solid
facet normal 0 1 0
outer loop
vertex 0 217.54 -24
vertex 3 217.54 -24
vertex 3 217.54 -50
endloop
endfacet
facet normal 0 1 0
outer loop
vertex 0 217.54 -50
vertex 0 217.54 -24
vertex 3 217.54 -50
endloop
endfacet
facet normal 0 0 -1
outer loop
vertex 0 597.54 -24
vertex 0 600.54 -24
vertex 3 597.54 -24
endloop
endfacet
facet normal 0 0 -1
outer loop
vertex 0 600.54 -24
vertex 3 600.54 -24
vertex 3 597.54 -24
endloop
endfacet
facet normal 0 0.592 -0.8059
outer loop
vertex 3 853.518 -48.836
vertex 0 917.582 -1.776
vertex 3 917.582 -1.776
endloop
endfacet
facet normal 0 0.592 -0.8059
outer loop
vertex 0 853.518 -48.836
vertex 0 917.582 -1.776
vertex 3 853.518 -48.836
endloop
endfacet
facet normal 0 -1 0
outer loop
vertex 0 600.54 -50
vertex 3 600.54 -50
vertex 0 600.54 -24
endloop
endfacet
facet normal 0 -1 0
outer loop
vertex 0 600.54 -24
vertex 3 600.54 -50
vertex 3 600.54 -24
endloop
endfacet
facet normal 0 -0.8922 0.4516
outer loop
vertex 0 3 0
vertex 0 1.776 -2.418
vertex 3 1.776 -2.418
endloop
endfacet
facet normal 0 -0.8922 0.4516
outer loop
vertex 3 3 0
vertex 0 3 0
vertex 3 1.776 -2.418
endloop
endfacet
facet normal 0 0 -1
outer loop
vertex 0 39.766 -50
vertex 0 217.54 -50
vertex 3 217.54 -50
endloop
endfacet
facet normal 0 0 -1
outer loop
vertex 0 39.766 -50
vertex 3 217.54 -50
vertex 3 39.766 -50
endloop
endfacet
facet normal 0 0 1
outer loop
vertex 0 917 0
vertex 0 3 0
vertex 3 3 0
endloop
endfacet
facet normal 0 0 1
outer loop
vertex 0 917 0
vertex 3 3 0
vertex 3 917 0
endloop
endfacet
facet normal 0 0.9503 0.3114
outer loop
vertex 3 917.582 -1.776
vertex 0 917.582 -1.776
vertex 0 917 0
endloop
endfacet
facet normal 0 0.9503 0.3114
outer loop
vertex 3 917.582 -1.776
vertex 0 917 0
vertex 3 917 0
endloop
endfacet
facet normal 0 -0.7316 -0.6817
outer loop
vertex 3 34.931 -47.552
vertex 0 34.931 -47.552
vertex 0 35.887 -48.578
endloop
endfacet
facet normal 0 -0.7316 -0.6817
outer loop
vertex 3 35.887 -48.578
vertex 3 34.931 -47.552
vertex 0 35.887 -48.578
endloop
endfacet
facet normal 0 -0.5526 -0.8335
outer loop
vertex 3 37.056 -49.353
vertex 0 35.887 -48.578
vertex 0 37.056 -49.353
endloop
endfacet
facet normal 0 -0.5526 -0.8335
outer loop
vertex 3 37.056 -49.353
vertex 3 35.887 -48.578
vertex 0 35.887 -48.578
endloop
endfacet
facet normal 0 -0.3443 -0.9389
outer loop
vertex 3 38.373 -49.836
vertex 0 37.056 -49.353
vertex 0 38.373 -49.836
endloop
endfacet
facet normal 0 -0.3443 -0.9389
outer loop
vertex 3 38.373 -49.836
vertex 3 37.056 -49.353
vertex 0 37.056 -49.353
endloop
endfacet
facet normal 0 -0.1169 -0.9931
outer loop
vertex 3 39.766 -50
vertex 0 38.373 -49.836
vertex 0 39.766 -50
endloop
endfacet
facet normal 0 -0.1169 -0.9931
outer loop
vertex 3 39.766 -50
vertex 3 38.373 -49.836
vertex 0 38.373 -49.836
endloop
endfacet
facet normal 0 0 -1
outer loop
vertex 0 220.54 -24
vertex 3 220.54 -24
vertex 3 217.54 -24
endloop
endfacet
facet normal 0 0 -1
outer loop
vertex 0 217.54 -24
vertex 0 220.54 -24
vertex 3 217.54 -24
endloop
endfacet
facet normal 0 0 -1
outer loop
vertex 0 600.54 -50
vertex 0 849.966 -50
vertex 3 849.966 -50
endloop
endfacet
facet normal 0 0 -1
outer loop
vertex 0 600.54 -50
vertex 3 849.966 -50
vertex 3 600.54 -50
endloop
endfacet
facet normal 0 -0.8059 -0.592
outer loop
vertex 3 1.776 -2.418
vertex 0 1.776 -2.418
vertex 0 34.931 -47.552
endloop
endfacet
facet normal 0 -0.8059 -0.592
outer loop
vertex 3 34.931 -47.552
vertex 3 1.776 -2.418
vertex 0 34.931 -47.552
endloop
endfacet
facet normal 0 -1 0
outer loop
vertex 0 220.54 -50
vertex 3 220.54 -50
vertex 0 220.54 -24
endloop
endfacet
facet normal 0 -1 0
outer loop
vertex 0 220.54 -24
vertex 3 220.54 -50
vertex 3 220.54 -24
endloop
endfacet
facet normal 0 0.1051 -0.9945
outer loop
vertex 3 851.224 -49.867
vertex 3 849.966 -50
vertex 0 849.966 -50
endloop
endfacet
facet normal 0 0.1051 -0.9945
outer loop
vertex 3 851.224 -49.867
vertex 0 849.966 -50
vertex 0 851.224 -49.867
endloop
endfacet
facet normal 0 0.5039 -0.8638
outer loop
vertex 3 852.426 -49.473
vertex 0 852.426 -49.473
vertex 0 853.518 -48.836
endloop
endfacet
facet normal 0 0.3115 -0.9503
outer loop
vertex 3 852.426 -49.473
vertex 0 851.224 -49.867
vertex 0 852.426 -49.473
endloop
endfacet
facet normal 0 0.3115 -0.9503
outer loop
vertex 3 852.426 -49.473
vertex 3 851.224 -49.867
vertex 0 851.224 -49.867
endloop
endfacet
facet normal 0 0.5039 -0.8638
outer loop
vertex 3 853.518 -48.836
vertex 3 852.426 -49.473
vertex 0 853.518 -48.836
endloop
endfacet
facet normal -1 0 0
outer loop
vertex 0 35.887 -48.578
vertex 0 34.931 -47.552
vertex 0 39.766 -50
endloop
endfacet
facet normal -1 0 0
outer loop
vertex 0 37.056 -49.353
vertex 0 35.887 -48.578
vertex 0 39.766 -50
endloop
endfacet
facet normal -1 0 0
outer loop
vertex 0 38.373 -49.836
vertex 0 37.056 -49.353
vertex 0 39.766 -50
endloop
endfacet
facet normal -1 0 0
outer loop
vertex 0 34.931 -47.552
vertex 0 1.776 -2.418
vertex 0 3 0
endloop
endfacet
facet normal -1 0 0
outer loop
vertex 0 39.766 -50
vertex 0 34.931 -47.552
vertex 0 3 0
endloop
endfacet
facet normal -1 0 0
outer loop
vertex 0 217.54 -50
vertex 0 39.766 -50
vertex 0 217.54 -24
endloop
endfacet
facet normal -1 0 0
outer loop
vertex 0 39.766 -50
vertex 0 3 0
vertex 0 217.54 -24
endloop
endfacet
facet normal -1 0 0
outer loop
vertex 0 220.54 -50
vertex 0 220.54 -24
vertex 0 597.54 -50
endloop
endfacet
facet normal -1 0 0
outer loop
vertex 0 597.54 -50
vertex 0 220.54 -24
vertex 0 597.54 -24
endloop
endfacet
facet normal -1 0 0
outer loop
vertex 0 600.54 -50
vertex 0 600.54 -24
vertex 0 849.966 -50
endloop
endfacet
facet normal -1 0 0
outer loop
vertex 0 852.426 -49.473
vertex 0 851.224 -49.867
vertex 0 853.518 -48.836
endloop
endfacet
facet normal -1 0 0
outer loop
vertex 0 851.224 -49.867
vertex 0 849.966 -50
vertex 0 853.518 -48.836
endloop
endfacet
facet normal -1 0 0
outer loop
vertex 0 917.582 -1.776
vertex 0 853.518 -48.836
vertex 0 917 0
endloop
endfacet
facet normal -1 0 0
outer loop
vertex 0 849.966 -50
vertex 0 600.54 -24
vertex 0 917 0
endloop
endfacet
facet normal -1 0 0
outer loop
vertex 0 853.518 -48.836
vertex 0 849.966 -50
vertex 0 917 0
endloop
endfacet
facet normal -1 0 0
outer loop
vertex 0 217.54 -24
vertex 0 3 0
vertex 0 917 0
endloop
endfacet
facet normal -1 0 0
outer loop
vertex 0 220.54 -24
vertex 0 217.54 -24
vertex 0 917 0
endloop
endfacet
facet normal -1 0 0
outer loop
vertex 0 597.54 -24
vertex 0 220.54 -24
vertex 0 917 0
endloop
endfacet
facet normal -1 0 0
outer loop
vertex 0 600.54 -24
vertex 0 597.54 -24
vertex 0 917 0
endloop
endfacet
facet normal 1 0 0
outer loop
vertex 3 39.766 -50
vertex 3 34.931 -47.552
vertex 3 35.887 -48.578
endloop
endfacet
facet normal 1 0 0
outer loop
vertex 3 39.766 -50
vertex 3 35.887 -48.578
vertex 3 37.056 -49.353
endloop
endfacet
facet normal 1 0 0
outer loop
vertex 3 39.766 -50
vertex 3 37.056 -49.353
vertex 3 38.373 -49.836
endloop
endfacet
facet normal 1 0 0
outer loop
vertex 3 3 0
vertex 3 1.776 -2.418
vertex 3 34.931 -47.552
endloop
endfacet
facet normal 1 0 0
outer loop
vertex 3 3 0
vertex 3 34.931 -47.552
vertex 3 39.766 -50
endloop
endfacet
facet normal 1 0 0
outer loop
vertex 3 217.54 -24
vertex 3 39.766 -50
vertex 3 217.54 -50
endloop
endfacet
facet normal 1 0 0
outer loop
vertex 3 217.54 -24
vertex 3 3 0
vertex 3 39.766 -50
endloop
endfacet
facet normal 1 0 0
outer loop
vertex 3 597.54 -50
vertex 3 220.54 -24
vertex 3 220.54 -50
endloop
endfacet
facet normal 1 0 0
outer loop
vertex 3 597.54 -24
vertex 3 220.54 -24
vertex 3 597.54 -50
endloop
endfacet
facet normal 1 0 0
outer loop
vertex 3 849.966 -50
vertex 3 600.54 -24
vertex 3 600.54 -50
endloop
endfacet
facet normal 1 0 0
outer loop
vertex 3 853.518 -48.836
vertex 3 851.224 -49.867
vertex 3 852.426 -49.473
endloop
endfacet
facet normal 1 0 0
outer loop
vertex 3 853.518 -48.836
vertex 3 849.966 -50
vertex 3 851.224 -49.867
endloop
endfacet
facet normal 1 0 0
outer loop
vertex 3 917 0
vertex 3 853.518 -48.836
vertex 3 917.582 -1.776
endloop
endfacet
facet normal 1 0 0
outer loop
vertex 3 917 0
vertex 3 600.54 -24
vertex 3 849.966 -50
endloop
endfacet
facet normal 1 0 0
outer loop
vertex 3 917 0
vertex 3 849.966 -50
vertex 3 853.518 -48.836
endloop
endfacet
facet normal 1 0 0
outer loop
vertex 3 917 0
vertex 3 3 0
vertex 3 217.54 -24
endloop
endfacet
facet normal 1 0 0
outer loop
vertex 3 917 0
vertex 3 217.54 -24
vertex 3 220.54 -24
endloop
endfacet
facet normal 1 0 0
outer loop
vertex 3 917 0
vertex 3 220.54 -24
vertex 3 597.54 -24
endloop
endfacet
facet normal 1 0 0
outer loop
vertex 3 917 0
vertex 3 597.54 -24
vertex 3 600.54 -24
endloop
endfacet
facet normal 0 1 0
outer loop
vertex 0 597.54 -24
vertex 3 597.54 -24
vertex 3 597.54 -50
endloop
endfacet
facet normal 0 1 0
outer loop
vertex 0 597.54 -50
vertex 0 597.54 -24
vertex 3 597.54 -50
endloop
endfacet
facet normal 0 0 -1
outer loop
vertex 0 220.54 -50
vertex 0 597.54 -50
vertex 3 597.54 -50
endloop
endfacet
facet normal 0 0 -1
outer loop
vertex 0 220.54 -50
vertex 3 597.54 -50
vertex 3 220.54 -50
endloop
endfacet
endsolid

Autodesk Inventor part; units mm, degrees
ref_plane "YZ Plane" through (0, 0, 0) normal (1, 0, 0) x (0, 1, 0)
ref_plane "XZ Plane" through (0, 0, 0) normal (0, 1, 0) x (-1, 0, 0)
ref_plane "XY Plane" through (0, 0, 0) normal (0, 0, 1) x (1, 0, 0)
sketch "Sketch2" plane through (0, 0, 0) normal (1, 0, 0) x (0, 1, 0)
  line L0 (0, 0) -> (920, 0)
  line L1 (920, 0) -> (920, -50)
  line L2 (920, -50) -> (0, -50)
  line L3 (0, -50) -> (0, 0)
  line L4 (920, -50) -> (883.2713, 0) construction
  line L5 (920, 0) -> (851.9332, -50)
  line L6 (0, 0) -> (36.7287, -50)
  dimension "d28" = 920
  dimension "d29" = 50
  dimension "d31" = 36.3
  dimension "d32" = 53.7
  dimension "d36" = 53.7
extrude "Plate2" add sketch "Sketch2" along normal blind 3 contours L0 L5 L2 L6
chamfer "Corner Chamfer1" distance 3 angle 45 2 edges at (1.5, 920, 0) (1.5, 0, 0)
fillet "Corner Round1" radius 6 2 edges at (1.5, 36.7287, -50) (1.5, 851.9332, -50)
sketch "Sketch3" plane through (3, 0, 0) normal (1, 0, 0) x (0, 0, -1)
  line L0 (24, 217.54) -> (50, 217.54)
  line L1 (50, 217.54) -> (50, 220.54)
  line L2 (50, 220.54) -> (24, 220.54)
  line L3 (24, 220.54) -> (24, 217.54)
  line L4 (50, 849.9663) -> (50, 39.766) projected
  line L5 (50, 219.04) -> (0, 219.04) construction
  line L6 (0, 3) -> (0, 917) projected
  line L7 (50, 599.04) -> (0, 599.04) construction
  line L8 (24, 597.54) -> (50, 597.54)
  line L9 (50, 597.54) -> (50, 600.54)
  line L10 (50, 600.54) -> (24, 600.54)
  line L11 (24, 600.54) -> (24, 597.54)
  point P0 (0, 0)
  dimension "d39" = 26
  dimension "d40" = 3
  dimension "d41" = 219.04
  dimension "d42" = 599.04
  dimension "d43" = 3
  dimension "d44" = 26
extrude "Extrusion1" cut sketch "Sketch3" against normal through all
sketch "Sketch4" plane through (3, 0, 0) normal (1, 0, 0) x (0, 0, -1)
  line L0 (17.0121, 486.3959) -> (33.8114, 486.3959) construction
  line L1 (33.8114, 486.3959) -> (33.8114, 335.9678) construction
  line L2 (33.8114, 335.9678) -> (17.0121, 335.9678) construction
  line L3 (17.0121, 335.9678) -> (17.0121, 486.3959) construction
  point P0 (0, 0)
mark "Mark1"
equation "\"d36\" = d32"
equation "\"d40\" = Thickness"
equation "\"d43\" = Thickness"
equation "\"d44\" = d39"
equation "\"d30\" = Thickness"
equation "\"BendReliefWidth\" = Thickness"
equation "\"BendReliefDepth\" = 0.5 * Thickness"
equation "\"CornerReliefSize\" = 4 * Thickness"
equation "\"MinimumRemnant\" = 2 * Thickness"
equation "\"TransitionRadius\" = BendRadius"
equation "\"JacobiRadiusSize\" = BendRadius"
equation "\"GapSize\" = Thickness"
equation "\"Thickness\" = 3"
equation "\"BendRadius\" = 5"
properties part number "MSC 110 STRINGER CONE" material "Stainless Steel"
